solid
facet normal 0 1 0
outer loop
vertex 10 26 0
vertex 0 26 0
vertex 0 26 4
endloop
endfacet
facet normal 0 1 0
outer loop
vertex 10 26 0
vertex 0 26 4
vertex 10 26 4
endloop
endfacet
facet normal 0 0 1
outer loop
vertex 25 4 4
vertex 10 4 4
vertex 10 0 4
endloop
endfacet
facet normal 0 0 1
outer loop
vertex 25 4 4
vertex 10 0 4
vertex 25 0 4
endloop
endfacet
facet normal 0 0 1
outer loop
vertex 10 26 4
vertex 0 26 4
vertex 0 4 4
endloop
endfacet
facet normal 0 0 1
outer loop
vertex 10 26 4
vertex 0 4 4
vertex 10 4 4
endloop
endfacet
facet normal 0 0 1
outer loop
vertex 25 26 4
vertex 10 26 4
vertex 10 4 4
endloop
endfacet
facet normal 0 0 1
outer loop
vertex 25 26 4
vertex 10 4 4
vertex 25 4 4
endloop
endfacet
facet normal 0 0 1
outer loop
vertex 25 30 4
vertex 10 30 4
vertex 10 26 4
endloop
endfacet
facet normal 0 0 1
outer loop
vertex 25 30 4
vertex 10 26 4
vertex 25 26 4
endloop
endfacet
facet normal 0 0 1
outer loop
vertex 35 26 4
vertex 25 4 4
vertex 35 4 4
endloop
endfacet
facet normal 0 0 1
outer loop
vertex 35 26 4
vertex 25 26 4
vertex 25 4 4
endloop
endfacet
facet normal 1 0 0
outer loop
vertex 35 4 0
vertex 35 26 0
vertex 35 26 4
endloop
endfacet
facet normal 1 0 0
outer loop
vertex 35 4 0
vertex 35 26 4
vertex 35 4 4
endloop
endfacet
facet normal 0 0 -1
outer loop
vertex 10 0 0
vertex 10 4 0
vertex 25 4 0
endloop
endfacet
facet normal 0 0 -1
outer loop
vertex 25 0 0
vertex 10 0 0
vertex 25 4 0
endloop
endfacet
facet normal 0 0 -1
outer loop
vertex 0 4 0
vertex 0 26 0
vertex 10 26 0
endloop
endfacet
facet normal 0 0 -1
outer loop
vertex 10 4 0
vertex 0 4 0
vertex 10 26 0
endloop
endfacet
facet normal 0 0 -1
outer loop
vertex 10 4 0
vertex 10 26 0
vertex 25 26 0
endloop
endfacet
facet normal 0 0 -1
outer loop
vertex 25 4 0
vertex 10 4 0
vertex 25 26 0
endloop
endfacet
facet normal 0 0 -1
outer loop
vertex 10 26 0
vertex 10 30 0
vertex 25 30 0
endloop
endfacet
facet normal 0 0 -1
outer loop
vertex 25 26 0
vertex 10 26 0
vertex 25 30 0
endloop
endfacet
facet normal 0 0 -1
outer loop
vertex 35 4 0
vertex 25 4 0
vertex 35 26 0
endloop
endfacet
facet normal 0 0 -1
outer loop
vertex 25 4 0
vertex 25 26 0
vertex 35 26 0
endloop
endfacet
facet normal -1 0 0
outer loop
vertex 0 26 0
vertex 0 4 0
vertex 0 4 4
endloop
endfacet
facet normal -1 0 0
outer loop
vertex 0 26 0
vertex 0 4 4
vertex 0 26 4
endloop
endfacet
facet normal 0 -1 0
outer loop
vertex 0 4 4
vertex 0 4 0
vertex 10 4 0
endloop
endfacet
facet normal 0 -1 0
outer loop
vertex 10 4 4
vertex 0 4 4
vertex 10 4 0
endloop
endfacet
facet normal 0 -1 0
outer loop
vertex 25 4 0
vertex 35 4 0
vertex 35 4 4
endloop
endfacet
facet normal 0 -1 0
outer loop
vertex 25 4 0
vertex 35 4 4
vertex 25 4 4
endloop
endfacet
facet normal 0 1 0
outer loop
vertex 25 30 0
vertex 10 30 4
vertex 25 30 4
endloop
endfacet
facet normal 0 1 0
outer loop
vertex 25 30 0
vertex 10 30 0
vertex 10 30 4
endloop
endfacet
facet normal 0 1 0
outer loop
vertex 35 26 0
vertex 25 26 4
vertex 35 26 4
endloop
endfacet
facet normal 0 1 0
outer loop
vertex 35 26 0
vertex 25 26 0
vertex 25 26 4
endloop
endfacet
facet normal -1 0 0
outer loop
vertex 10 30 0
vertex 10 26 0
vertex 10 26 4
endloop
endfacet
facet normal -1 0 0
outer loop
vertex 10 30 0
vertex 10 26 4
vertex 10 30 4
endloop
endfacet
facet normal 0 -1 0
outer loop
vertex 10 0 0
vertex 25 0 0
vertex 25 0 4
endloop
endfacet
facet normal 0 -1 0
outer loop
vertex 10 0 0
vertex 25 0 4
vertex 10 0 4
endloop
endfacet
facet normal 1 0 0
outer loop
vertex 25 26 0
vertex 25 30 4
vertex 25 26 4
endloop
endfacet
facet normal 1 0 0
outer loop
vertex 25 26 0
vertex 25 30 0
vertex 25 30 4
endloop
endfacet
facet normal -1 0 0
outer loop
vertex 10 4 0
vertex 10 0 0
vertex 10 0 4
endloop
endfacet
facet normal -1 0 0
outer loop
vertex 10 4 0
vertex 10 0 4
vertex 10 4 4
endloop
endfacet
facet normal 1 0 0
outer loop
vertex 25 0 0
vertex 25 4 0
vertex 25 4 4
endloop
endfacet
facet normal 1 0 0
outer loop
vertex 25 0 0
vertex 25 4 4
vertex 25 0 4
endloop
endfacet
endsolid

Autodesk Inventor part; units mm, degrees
ref_plane "YZ Plane" through (0, 0, 0) normal (1, 0, 0) x (0, 1, 0)
ref_plane "XZ Plane" through (0, 0, 0) normal (0, 1, 0) x (-1, 0, 0)
ref_plane "XY Plane" through (0, 0, 0) normal (0, 0, 1) x (1, 0, 0)
sketch "Sketch1" plane through (0, 0, 0) normal (0, 0, 1) x (1, 0, 0)
  line L0 (0, 4) -> (0, 26)
  line L1 (0, 26) -> (10, 26)
  line L2 (10, 26) -> (10, 30)
  line L3 (10, 30) -> (25, 30)
  line L4 (25, 30) -> (25, 26)
  line L5 (25, 26) -> (35, 26)
  line L6 (35, 26) -> (35, 4)
  line L7 (35, 4) -> (25, 4)
  line L8 (25, 4) -> (25, 0)
  line L9 (25, 0) -> (10, 0)
  line L10 (10, 0) -> (10, 4)
  line L11 (0, 4) -> (10, 4)
  point P0 (0, 0)
  dimension "d0" = 22
  dimension "d1" = 10
  dimension "d2" = 4
  dimension "d3" = 15
  dimension "d4" = 10
  dimension "d5" = 22
extrude "Extrusion1" add sketch "Sketch1" along normal blind 4
properties part number "stubbur"
